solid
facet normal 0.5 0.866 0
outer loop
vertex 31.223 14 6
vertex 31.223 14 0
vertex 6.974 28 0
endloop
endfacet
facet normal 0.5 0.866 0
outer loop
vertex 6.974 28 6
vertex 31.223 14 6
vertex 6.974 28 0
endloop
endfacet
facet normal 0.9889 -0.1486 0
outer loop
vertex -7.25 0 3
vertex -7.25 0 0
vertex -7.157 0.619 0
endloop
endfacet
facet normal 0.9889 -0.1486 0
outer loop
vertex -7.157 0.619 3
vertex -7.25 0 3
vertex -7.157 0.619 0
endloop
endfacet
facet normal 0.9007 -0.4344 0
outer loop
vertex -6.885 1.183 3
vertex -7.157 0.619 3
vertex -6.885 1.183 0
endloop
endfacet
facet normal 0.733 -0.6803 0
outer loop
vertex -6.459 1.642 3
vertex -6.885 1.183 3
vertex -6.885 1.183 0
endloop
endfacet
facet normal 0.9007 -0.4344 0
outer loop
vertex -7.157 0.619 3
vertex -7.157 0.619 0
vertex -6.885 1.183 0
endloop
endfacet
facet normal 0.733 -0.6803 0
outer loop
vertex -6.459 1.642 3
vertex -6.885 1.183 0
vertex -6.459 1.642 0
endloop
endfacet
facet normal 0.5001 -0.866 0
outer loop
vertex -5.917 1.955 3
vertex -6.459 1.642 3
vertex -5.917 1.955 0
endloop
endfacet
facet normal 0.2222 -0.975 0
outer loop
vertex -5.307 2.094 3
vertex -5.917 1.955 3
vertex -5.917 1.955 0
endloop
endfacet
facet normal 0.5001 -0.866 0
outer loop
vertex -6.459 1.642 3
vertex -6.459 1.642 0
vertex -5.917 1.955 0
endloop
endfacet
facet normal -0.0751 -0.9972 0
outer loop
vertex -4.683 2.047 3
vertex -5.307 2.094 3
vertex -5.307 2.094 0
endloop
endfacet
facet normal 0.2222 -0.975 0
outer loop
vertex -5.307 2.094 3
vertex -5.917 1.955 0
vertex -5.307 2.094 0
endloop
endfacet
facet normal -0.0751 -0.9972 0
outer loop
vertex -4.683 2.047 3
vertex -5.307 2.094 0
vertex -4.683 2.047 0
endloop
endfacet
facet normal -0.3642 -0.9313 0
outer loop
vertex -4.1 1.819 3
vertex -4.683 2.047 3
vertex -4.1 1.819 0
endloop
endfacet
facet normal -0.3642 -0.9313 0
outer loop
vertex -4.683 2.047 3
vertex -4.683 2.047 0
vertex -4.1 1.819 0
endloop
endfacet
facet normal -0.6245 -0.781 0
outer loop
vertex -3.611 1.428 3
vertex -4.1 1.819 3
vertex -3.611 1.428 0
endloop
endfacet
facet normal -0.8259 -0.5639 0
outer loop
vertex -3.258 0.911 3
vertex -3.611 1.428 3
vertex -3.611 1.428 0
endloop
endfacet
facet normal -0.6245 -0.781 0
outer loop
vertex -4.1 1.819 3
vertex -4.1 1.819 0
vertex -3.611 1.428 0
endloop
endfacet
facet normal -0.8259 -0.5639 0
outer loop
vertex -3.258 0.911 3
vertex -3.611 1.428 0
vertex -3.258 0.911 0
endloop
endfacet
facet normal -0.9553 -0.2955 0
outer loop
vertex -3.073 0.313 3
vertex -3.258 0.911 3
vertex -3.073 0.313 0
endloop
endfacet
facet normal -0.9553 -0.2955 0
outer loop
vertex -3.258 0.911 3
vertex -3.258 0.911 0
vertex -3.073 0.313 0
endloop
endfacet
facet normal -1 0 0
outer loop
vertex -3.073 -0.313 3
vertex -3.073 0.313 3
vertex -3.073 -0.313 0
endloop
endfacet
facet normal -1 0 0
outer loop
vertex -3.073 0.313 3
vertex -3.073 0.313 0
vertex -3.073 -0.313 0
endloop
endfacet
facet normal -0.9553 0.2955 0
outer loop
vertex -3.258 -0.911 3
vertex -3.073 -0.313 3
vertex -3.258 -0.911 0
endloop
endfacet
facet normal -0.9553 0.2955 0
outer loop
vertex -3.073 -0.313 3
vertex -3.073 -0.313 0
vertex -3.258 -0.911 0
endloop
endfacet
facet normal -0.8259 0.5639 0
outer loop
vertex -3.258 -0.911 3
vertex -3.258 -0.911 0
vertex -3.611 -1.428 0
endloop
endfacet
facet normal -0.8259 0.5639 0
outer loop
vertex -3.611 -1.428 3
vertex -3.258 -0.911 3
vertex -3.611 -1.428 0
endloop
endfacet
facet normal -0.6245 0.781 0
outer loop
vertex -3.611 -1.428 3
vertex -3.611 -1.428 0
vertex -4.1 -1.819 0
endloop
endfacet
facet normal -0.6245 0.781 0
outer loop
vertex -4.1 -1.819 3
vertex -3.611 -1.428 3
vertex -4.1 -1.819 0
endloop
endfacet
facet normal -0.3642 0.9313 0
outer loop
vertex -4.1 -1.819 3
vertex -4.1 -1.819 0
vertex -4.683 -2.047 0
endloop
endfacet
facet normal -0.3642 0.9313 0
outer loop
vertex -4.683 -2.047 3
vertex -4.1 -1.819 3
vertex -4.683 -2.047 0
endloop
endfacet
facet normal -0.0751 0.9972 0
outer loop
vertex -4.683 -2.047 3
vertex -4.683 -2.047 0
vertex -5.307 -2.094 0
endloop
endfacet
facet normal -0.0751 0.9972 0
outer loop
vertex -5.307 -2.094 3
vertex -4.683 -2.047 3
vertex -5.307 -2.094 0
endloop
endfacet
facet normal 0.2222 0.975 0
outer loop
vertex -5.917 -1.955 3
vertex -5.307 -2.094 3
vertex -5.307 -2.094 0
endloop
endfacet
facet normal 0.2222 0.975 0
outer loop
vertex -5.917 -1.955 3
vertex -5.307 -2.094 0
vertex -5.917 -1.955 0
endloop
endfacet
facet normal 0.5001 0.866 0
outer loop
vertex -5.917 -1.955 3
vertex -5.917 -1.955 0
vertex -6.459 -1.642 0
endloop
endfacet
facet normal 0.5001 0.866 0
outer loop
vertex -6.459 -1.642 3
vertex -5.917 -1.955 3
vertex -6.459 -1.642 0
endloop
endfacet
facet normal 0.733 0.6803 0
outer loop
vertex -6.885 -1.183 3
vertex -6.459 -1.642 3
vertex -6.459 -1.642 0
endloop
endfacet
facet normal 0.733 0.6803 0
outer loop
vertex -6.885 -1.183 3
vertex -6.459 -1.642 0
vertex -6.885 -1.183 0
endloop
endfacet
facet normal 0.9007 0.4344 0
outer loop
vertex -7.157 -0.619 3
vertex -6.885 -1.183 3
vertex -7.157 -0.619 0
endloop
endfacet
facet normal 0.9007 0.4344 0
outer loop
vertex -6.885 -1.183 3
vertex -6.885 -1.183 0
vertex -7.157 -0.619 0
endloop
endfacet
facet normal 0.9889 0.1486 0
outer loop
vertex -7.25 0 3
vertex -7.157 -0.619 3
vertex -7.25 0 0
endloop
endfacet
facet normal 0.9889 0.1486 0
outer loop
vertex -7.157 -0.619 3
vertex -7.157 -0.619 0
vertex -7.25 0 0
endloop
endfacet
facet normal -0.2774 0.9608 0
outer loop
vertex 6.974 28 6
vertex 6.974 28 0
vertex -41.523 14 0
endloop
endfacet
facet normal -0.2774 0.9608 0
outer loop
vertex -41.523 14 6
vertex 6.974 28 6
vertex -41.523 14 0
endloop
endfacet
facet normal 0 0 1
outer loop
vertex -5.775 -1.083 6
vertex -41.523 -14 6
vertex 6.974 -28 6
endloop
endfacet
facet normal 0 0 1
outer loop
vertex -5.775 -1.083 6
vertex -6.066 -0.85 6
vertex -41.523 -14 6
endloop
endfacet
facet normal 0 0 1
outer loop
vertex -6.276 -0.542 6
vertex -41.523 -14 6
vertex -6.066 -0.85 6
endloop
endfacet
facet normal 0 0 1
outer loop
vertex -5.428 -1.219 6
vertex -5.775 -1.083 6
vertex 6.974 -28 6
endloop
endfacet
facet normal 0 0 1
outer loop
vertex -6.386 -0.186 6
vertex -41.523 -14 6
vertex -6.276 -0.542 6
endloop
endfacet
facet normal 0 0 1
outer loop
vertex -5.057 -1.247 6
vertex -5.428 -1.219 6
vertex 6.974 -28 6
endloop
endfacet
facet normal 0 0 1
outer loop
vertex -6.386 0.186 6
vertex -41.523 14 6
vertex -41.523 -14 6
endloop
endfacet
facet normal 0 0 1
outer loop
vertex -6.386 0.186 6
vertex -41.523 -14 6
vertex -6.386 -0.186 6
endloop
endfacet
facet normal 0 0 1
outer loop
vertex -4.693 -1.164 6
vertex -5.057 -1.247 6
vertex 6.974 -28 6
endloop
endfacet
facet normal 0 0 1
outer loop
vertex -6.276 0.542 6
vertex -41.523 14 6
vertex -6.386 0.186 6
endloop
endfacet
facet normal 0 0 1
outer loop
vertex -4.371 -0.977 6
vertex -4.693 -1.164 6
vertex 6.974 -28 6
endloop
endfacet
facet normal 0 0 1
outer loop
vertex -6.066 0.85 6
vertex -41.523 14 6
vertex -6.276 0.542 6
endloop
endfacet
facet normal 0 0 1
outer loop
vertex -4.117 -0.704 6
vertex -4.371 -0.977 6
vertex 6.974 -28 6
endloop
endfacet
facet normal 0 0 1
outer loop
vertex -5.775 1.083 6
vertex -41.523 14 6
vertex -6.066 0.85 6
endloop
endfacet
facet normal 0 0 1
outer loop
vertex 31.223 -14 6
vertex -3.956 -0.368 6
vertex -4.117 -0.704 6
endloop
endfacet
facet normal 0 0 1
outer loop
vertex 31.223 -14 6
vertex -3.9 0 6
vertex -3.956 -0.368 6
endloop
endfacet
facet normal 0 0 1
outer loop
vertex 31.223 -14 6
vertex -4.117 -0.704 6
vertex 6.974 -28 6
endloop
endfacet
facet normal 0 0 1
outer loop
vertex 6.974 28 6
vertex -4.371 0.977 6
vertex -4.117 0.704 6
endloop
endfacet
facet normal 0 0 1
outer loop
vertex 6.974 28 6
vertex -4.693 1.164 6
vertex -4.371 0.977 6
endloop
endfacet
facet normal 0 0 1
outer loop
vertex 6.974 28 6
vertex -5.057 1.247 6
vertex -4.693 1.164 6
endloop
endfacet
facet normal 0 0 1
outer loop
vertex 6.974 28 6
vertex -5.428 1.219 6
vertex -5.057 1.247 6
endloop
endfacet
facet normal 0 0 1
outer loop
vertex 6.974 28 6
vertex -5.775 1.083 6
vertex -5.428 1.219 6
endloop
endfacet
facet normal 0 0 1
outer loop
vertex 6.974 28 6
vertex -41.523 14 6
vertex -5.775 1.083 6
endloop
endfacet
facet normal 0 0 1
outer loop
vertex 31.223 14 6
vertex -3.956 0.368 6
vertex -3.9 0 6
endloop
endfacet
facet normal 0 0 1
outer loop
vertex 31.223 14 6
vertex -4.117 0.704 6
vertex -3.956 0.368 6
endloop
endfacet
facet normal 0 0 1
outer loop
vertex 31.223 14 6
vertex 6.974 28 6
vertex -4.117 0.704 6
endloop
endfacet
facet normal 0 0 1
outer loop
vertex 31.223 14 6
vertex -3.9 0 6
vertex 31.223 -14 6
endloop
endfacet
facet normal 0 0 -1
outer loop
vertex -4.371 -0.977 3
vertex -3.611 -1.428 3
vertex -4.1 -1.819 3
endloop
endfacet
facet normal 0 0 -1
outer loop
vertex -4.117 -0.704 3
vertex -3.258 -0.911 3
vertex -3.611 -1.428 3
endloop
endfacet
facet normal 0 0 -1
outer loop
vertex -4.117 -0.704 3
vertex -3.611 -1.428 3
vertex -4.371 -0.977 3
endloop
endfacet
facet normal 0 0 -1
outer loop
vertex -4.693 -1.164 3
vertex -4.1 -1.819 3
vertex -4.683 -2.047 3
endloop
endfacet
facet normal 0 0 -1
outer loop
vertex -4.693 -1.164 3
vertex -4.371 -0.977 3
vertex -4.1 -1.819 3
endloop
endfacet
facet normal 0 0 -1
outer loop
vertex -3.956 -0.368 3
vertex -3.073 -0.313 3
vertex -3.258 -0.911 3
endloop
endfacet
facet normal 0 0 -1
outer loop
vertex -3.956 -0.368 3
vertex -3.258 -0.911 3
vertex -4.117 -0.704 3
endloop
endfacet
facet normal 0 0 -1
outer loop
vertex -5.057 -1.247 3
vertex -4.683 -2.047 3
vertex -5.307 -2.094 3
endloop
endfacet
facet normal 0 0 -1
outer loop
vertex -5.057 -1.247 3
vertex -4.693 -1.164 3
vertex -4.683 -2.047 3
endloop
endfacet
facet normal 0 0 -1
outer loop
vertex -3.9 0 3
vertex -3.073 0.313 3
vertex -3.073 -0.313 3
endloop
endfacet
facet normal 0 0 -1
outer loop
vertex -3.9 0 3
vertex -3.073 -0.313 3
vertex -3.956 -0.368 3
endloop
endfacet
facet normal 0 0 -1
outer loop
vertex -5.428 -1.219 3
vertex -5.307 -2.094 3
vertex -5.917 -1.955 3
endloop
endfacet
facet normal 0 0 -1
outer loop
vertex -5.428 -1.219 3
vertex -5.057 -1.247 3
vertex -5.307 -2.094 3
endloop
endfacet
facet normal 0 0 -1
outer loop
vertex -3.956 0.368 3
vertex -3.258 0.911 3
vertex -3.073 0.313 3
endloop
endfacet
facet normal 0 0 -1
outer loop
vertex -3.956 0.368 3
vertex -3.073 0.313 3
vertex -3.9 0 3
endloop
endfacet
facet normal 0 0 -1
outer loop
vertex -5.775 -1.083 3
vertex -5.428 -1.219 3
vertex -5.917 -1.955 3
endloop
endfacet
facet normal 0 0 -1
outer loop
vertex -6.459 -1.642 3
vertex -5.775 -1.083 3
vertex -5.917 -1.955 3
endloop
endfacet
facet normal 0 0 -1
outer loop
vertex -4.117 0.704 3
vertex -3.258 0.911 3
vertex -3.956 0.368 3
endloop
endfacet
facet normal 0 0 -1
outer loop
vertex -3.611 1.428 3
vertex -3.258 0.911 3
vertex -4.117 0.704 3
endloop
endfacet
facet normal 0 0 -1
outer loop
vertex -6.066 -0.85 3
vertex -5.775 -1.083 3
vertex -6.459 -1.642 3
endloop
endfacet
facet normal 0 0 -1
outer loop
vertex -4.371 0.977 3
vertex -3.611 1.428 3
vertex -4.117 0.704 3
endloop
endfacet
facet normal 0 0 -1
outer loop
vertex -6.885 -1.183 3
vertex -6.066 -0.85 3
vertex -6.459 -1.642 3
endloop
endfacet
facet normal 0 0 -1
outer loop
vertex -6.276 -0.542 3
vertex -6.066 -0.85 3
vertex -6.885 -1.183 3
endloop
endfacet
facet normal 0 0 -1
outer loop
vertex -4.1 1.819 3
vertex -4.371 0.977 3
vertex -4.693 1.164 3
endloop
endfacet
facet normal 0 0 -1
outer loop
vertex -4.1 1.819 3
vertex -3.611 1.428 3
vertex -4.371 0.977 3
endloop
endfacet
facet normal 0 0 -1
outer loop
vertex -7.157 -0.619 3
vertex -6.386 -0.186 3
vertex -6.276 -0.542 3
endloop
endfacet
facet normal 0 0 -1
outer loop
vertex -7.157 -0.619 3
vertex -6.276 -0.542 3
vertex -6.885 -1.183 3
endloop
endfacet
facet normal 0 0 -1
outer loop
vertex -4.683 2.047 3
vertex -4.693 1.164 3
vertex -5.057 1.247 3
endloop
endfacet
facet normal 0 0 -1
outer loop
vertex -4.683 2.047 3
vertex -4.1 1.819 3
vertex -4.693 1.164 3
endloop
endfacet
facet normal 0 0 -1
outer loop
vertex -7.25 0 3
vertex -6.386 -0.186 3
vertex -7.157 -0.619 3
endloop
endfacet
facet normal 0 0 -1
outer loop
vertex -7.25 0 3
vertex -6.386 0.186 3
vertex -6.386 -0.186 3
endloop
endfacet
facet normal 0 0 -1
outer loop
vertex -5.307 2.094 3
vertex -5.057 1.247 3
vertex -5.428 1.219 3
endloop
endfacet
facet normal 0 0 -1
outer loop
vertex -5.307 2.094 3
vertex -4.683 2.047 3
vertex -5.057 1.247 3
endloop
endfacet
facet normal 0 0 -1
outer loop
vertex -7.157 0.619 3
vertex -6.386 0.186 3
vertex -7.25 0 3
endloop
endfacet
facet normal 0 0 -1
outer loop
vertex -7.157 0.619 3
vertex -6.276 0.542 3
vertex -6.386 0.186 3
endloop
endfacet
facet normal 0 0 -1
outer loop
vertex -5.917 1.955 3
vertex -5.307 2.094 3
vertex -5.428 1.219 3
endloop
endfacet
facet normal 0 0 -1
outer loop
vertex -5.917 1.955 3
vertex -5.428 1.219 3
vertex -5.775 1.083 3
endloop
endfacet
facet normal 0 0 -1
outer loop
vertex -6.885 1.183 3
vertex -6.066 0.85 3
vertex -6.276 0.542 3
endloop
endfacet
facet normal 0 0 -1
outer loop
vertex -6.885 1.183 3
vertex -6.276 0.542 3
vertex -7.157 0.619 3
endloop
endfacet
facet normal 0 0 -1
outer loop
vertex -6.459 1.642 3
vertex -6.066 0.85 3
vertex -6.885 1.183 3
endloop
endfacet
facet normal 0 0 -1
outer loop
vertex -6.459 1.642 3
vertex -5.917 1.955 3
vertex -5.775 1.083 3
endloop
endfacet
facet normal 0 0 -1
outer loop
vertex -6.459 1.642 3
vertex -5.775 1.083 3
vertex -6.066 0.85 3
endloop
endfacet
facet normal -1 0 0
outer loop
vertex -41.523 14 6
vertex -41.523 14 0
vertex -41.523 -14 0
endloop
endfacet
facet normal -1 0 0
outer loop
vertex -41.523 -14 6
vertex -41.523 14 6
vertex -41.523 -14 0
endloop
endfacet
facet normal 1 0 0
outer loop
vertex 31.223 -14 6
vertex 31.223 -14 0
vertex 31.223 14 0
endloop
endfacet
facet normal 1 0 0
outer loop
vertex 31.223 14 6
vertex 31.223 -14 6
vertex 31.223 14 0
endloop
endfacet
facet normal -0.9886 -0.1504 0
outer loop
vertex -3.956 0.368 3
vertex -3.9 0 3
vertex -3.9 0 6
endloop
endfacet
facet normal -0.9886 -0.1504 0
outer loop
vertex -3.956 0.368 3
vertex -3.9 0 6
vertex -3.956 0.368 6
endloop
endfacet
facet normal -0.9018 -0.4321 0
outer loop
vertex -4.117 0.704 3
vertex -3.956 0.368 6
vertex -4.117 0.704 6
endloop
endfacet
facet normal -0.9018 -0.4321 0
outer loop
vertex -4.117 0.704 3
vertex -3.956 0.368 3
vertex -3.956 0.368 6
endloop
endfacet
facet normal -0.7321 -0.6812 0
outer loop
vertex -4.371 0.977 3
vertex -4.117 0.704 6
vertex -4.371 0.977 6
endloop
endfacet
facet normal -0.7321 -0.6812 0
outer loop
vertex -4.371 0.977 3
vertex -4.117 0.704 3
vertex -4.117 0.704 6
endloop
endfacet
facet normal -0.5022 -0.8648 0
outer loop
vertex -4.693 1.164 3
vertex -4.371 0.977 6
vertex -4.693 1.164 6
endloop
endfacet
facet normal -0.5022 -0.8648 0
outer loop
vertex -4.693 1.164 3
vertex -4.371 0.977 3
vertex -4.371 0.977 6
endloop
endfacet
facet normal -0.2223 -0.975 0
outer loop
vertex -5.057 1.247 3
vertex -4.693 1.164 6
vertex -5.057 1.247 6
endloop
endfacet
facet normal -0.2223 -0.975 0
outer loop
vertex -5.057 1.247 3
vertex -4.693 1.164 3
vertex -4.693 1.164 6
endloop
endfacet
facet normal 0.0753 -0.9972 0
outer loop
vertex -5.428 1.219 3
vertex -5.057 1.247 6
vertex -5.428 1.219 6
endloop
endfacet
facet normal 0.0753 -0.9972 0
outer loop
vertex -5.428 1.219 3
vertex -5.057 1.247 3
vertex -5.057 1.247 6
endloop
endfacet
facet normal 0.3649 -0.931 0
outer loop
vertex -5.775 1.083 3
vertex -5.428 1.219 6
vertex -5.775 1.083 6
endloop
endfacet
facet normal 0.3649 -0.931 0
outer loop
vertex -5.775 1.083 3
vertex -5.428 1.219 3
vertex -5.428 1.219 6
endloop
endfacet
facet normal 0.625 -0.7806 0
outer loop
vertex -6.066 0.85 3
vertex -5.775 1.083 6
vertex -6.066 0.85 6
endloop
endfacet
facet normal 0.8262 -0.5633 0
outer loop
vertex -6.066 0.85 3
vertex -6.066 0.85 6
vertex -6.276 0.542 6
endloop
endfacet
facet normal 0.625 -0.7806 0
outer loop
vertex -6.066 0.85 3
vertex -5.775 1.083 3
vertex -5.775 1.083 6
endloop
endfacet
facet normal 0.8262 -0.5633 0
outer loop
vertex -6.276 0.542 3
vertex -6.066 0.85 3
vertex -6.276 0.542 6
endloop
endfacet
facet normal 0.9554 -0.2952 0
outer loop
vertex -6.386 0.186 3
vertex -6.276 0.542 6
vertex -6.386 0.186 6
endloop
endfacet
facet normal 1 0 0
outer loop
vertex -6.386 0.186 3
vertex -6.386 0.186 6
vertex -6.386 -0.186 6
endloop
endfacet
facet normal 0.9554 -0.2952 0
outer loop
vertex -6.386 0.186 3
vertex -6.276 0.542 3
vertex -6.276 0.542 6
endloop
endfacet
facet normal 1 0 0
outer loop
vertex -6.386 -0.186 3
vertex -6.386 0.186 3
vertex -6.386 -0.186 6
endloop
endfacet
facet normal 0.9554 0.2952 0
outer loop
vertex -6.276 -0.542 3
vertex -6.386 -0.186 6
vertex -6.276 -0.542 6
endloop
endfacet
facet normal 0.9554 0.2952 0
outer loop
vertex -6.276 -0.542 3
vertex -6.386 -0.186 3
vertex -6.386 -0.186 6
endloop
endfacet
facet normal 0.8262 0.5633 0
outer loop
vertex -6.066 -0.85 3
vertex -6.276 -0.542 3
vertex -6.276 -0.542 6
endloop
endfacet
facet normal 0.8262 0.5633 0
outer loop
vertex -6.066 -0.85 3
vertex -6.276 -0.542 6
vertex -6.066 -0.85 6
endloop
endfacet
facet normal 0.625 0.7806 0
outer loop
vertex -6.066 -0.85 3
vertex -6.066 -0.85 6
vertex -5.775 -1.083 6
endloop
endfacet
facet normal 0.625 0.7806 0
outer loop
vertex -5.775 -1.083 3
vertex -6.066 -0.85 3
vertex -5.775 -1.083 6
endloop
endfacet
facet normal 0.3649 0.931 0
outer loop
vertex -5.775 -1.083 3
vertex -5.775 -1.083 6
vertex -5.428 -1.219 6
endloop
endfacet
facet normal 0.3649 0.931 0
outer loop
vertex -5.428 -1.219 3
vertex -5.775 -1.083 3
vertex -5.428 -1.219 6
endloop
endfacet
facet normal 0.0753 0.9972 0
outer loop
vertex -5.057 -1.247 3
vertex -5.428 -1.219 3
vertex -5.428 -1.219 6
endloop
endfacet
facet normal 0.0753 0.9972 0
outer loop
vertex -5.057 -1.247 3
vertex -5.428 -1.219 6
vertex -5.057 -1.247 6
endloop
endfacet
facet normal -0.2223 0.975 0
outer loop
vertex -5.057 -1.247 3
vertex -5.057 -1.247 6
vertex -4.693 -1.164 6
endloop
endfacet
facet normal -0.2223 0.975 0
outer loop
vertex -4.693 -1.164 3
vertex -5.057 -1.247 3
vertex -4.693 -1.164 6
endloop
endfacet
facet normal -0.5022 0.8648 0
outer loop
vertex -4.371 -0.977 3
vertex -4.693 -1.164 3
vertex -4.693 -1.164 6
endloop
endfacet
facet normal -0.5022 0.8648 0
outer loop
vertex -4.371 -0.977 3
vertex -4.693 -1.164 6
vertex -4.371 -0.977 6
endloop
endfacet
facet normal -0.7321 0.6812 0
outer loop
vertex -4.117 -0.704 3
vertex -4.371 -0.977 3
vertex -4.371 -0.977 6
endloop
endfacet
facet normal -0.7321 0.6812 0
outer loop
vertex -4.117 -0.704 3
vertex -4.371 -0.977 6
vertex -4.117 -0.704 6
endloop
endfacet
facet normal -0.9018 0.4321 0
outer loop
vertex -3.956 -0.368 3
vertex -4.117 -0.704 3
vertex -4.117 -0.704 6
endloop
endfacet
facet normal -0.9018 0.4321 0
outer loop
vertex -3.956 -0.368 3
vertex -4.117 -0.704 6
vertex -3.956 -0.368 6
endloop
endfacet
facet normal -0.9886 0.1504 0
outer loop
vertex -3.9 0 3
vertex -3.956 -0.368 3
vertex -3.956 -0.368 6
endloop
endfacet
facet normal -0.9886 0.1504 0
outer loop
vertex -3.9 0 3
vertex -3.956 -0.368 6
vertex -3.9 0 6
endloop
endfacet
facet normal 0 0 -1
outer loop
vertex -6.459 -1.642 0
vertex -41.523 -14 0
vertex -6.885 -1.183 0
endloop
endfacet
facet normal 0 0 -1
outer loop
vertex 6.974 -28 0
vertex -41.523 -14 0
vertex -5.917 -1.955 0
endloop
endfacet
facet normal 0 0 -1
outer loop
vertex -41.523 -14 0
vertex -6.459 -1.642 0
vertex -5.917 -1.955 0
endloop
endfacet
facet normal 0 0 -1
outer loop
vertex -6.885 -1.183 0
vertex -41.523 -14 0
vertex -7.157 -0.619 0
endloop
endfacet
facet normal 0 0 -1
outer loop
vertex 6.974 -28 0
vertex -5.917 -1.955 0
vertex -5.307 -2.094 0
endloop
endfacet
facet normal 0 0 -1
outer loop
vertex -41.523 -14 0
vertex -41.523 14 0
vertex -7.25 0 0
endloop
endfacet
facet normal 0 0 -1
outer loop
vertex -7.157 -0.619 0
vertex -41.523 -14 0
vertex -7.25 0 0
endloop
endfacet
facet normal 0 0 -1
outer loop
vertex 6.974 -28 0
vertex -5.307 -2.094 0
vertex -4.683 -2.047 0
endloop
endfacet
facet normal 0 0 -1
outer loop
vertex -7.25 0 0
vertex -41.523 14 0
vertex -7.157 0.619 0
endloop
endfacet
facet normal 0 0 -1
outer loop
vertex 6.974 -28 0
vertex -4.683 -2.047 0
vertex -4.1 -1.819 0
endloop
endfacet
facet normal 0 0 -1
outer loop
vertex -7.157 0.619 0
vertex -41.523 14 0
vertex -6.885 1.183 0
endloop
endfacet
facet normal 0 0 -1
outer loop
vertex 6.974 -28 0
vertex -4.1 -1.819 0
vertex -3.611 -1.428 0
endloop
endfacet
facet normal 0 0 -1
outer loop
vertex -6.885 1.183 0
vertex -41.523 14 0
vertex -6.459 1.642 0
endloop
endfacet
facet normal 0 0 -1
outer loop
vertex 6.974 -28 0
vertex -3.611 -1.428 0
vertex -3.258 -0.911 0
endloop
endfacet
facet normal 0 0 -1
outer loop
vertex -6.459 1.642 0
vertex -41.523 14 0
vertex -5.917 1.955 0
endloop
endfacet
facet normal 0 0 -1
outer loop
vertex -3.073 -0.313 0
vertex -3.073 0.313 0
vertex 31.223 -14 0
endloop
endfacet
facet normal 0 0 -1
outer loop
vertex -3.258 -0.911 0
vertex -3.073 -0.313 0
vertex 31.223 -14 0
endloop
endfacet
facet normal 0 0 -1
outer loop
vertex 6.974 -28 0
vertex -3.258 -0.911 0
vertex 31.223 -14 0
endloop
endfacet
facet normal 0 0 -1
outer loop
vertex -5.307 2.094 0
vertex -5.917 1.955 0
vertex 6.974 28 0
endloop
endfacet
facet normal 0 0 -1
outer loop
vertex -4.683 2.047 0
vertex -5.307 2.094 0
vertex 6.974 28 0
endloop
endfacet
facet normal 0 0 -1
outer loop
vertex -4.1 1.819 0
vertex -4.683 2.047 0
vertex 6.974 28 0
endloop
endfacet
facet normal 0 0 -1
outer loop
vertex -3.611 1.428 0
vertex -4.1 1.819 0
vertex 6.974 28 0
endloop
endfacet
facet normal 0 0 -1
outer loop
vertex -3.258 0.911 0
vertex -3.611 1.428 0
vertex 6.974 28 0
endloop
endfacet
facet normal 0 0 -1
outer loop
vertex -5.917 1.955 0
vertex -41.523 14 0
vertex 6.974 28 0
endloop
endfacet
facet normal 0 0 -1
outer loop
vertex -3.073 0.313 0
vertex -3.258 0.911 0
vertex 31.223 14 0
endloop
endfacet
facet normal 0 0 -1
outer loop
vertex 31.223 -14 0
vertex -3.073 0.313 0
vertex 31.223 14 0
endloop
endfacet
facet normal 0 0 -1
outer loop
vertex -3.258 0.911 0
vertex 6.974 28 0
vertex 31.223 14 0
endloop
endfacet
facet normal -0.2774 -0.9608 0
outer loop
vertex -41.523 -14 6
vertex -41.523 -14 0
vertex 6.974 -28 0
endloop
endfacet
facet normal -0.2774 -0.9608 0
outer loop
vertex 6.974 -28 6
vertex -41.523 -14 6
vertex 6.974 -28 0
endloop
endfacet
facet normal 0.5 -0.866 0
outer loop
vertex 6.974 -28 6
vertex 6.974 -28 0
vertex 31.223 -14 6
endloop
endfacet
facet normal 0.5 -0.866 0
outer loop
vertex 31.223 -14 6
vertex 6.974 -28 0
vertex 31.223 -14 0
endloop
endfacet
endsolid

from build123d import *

# Parameters (mm, degrees)
SKETCH1_R           = 1.25
BOSS_EXTRUDE1_DEPTH = 6
SKETCH2_R           = 2.1
CUT_EXTRUDE1_DEPTH  = 3


with BuildPart() as part:
    # Sketch1 → Boss-Extrude1 (new body)
    with BuildSketch(Plane.XY):
        Polygon((-41.523066959, 14), (-41.523066959, -14), (6.974355653, -28), (31.223066959, -14), (31.223066959, 14), (6.974355653, 28), align=None)
        with Locations((-5.15, 0)):
            Circle(SKETCH1_R, mode=Mode.SUBTRACT)
    extrude(amount=BOSS_EXTRUDE1_DEPTH)

    # Sketch2 → Cut-Extrude1 (cut)
    with BuildSketch(Plane(origin=(0, 0, 0), x_dir=(-1, 0, 0), z_dir=(0, 0, -1))):
        with Locations((5.15, 0)):
            Circle(SKETCH2_R)
    extrude(amount=-CUT_EXTRUDE1_DEPTH, mode=Mode.SUBTRACT)


solid = part.part
